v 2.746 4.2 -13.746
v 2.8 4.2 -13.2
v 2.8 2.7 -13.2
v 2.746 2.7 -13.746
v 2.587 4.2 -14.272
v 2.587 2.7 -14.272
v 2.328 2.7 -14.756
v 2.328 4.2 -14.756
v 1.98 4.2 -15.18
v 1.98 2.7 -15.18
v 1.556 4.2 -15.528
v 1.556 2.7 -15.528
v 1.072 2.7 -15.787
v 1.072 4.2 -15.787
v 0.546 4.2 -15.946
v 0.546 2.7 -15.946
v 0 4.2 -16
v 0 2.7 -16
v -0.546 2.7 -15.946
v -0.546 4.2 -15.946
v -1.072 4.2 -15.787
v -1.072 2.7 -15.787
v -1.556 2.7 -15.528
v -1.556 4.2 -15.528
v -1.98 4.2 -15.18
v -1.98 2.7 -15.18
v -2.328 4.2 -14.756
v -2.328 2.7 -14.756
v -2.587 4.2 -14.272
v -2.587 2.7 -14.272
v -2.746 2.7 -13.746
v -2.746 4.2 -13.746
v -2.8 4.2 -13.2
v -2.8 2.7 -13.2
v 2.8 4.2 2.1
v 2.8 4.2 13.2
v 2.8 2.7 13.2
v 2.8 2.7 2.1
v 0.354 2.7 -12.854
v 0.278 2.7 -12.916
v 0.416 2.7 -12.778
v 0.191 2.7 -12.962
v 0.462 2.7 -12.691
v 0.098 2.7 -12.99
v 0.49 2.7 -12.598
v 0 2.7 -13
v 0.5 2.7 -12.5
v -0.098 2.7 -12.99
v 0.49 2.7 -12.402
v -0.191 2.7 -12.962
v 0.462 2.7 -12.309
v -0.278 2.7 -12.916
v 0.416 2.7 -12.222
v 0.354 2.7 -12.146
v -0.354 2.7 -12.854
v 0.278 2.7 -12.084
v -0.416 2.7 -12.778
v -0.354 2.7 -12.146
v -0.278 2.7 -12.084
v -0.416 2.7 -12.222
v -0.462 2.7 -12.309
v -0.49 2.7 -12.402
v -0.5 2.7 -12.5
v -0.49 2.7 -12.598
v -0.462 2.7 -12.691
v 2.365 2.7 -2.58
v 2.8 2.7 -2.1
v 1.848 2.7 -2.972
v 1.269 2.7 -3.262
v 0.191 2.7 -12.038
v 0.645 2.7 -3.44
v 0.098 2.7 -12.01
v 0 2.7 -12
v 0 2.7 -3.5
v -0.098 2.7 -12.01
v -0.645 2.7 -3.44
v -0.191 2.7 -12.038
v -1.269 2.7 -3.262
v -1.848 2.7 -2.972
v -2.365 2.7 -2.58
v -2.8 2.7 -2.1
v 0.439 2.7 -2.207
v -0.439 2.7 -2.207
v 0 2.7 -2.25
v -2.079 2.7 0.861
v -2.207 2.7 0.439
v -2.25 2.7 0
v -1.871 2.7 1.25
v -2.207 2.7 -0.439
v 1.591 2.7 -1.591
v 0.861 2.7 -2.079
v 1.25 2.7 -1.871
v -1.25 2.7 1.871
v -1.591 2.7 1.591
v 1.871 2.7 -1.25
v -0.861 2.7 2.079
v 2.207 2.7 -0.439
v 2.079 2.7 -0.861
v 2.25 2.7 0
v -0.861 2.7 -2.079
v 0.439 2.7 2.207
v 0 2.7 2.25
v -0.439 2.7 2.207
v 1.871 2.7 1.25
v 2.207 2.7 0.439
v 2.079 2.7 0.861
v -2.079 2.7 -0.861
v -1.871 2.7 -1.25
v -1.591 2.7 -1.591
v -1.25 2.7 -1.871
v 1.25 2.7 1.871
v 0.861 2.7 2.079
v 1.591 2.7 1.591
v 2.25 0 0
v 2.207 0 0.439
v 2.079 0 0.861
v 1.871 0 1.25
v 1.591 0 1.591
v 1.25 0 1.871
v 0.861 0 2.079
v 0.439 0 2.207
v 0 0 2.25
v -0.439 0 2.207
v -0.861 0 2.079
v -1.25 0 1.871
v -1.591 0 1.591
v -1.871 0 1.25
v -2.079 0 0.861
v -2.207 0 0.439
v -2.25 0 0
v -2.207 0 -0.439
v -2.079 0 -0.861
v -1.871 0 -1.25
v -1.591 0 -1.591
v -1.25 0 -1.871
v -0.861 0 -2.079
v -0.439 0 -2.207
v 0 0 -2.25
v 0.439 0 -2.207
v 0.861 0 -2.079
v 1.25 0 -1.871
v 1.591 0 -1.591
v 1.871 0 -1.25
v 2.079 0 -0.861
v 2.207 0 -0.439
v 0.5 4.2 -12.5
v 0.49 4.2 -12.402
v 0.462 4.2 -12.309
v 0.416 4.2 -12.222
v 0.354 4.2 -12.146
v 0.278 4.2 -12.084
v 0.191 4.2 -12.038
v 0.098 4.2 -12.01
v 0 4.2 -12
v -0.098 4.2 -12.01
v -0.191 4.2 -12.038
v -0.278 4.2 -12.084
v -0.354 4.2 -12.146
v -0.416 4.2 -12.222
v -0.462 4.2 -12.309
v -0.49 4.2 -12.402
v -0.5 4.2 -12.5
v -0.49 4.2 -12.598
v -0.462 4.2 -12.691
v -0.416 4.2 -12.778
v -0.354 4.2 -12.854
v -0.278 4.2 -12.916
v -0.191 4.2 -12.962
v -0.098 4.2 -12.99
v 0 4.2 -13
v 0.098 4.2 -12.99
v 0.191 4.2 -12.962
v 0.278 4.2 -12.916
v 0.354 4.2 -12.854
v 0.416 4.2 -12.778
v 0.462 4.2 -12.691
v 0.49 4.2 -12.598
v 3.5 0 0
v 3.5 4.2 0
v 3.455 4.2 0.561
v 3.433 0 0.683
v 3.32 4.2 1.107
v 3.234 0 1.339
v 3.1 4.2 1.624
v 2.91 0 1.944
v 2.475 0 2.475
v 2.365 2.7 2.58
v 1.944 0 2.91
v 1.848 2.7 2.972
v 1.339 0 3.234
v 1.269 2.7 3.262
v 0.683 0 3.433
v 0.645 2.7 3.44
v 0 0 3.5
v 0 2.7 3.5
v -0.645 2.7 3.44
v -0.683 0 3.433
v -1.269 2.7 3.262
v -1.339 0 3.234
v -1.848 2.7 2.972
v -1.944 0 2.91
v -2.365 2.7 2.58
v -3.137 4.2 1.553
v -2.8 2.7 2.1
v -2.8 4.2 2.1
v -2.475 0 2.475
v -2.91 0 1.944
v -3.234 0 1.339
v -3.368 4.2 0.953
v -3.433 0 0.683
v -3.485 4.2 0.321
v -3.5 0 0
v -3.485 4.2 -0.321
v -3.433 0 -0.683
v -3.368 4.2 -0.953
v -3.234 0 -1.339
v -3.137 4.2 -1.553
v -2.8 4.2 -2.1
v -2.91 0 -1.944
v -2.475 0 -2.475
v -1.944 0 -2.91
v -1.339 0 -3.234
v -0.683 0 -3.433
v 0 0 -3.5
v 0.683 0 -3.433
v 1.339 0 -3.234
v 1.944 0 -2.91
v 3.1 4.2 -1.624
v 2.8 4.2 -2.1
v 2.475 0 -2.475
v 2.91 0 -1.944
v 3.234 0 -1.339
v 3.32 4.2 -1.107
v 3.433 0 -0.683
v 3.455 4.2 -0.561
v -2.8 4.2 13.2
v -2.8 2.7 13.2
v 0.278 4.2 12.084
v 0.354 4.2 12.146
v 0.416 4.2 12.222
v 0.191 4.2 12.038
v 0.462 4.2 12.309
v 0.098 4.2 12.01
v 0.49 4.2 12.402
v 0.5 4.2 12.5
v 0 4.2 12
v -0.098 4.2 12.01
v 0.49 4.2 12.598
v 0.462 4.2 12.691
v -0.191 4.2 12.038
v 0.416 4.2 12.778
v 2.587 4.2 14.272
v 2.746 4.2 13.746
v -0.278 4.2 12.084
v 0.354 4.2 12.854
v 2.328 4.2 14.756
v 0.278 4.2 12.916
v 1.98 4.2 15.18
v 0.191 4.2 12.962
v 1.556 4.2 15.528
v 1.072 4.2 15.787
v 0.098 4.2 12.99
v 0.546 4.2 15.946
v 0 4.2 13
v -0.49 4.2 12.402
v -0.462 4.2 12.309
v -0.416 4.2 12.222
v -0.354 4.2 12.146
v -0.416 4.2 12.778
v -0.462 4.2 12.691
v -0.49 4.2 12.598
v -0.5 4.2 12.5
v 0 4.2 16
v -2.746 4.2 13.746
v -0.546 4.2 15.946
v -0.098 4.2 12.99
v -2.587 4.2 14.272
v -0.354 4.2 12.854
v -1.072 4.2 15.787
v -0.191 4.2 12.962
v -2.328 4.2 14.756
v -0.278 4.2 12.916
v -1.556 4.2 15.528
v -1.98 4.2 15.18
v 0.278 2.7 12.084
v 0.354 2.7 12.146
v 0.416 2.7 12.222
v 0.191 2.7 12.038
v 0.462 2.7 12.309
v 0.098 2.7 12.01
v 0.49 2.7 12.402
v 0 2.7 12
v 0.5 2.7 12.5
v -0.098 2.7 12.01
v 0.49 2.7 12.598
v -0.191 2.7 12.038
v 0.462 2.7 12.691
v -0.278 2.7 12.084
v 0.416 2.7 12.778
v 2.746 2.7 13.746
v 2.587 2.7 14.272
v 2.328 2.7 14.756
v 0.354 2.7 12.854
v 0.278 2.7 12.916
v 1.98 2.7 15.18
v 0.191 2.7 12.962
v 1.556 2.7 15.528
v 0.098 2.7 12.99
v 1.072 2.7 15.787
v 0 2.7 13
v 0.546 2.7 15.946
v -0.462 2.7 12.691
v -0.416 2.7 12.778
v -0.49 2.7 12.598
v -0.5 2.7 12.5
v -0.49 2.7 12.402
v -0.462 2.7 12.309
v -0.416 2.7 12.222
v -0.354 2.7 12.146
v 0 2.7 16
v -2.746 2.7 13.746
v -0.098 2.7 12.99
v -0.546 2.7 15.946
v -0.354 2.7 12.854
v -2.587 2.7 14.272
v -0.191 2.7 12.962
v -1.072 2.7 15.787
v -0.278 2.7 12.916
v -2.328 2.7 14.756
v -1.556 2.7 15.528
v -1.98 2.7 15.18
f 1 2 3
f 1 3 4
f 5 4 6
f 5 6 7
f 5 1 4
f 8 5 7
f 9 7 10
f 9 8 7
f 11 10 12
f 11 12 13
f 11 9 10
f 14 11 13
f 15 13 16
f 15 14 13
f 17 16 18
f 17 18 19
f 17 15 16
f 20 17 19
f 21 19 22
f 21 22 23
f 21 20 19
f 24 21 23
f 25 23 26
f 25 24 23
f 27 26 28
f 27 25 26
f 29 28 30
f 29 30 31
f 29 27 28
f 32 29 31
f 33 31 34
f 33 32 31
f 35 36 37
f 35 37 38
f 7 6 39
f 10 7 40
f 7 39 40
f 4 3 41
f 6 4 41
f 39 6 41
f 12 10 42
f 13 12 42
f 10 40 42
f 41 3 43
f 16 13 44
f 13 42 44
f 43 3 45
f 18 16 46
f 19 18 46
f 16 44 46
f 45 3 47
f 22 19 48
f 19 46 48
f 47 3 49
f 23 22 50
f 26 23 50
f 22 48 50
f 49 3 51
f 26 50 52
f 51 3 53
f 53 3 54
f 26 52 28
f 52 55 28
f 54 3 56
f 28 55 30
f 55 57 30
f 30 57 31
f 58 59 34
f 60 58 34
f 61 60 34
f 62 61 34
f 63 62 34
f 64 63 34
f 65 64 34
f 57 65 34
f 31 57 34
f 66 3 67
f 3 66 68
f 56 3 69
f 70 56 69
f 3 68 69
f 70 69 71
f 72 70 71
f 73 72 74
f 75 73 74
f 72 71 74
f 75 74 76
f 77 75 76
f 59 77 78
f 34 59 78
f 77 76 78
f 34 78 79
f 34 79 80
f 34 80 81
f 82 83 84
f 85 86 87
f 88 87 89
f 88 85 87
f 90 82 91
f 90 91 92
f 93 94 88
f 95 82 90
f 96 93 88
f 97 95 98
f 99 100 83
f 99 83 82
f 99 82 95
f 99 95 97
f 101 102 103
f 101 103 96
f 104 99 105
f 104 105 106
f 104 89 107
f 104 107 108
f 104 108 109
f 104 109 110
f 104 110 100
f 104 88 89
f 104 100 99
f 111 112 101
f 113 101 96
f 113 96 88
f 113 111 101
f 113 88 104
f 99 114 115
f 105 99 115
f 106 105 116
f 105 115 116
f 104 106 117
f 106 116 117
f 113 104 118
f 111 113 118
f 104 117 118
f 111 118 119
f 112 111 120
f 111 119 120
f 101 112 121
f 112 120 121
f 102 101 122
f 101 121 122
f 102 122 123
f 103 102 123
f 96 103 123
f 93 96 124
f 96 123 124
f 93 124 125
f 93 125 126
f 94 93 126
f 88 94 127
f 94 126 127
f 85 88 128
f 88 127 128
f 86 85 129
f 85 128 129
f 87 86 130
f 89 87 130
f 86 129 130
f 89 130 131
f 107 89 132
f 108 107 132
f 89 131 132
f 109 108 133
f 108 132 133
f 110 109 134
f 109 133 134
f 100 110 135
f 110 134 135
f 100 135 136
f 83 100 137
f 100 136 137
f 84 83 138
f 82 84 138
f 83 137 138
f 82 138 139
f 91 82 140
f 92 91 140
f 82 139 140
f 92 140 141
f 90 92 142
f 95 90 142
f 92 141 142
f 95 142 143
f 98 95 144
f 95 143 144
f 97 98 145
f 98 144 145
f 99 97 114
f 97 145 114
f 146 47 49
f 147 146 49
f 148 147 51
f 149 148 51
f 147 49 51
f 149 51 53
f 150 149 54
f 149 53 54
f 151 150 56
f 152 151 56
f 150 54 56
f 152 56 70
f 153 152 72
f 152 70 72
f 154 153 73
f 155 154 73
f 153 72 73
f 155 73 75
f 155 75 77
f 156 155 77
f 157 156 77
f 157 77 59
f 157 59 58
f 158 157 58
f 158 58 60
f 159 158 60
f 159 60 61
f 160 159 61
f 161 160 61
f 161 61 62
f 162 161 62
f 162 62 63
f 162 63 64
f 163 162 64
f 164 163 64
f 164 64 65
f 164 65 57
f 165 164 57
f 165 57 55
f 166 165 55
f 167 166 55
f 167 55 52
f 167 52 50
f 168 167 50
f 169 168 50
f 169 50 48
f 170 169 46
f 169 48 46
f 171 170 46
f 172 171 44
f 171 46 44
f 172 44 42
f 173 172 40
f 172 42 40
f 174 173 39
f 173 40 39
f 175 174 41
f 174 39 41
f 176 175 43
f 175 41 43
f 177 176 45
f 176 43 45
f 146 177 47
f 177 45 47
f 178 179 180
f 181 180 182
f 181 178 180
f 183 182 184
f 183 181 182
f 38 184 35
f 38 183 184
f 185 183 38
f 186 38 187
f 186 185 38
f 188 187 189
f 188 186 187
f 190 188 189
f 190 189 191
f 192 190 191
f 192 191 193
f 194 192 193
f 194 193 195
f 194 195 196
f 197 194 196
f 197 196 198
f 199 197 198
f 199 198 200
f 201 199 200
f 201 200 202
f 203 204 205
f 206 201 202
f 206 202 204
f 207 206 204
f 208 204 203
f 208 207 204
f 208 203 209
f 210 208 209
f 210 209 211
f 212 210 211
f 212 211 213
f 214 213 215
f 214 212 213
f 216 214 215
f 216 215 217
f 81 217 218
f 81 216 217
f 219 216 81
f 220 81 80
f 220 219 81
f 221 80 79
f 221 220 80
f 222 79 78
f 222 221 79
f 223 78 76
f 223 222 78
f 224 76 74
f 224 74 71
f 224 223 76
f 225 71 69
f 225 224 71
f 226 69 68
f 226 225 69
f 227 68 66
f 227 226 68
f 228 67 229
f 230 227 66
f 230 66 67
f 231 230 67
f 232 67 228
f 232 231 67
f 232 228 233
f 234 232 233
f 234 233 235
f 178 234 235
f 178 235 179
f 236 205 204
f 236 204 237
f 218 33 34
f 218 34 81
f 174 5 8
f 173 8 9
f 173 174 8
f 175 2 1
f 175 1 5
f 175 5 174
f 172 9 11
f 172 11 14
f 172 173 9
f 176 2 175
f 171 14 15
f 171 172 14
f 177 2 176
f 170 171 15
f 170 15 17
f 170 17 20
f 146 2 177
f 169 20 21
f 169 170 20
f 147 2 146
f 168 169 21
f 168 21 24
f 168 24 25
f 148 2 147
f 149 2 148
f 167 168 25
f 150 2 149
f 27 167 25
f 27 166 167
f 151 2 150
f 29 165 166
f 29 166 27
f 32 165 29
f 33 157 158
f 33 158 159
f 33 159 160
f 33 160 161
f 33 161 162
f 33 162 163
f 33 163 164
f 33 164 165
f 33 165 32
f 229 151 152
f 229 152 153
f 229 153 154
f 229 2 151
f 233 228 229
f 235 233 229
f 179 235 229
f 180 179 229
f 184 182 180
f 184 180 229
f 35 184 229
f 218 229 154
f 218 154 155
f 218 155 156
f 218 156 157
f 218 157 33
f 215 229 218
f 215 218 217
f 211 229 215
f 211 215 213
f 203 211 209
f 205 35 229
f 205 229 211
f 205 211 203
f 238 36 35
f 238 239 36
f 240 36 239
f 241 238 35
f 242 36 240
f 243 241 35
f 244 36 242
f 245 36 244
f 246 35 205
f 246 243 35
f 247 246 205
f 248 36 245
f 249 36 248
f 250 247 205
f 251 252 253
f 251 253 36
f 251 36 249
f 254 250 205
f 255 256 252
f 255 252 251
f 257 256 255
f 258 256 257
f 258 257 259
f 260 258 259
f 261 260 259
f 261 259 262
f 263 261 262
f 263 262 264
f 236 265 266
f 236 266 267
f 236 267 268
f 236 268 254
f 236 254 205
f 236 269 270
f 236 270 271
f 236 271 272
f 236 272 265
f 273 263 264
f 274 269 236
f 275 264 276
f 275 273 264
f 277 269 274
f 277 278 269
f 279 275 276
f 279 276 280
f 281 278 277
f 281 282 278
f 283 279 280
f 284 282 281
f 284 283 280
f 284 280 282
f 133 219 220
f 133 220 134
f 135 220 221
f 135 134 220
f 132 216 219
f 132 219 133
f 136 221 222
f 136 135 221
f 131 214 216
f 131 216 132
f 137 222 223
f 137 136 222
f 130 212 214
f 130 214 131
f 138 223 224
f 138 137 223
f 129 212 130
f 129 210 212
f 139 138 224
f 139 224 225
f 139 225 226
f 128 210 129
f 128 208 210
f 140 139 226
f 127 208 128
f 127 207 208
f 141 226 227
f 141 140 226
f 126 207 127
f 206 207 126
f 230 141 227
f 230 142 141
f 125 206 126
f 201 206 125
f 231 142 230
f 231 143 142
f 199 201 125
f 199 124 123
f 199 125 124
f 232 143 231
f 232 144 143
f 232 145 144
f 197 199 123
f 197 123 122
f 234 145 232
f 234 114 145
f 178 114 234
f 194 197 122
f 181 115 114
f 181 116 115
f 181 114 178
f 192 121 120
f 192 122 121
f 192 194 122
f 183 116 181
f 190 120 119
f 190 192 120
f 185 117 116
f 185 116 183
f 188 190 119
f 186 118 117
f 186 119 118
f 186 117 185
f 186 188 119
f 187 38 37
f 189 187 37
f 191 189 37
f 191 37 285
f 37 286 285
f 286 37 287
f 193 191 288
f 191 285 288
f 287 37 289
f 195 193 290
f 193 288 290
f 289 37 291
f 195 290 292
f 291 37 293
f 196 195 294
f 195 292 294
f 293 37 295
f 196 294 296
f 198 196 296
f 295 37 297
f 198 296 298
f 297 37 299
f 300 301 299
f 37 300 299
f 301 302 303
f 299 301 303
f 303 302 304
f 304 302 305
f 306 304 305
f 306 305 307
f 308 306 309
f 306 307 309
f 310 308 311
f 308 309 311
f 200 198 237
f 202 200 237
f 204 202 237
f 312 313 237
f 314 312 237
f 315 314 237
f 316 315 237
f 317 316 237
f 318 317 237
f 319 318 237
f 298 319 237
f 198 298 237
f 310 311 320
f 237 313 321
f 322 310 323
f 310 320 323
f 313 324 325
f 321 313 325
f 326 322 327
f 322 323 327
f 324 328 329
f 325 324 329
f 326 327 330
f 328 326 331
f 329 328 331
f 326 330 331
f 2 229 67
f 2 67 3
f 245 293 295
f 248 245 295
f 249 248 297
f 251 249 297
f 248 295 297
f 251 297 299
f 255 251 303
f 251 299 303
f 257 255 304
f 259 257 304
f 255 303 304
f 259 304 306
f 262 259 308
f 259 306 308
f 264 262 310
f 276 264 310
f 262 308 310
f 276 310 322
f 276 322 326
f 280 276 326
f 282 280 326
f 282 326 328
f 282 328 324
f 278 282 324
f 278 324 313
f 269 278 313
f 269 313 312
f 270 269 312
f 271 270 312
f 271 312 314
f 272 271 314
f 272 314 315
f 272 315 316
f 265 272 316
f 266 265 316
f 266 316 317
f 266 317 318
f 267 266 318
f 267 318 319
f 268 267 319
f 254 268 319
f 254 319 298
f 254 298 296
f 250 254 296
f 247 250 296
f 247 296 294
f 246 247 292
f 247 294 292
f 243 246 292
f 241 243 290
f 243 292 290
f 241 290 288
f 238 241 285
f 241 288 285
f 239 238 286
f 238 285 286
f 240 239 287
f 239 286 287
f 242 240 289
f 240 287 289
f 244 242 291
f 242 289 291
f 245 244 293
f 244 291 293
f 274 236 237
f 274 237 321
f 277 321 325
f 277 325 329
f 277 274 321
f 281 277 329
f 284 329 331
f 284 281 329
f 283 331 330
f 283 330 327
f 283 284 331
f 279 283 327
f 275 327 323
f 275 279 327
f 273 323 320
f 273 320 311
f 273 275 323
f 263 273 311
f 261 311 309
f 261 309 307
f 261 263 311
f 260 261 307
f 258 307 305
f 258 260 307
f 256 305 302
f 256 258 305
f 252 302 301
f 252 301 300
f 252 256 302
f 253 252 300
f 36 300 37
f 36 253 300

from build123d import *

# Parameters (mm, degrees)
F0_R     = 3.5
F1_DEPTH = 4.2
F3_DEPTH = 1.5
F4_R     = 0.5
F5_DEPTH = 25
F6_R     = 2.25
F7_DEPTH = 2.7


with BuildPart() as f1:
    # F0 (on Front) → F1 (new body)
    with BuildSketch(Plane.XZ):
        Circle(F0_R)
    extrude(amount=-F1_DEPTH)

    # F2 (on face) → F3 (join)
    with BuildSketch(Plane(origin=(0, 4.2, 0), x_dir=(-1, 0, 0), z_dir=(0, 1, 0))):
        with BuildLine():
            ThreePointArc((2.8, 13.2), (0, 16), (-2.8, 13.2))
            Line((-2.8, 13.2), (-2.8, -13.2))
            ThreePointArc((-2.8, -13.2), (0, -16), (2.8, -13.2))
            Line((2.8, -13.2), (2.8, 13.2))
        make_face()
    extrude(amount=-F3_DEPTH)

    # F4 (on face) → F5 (cut)
    with BuildSketch(Plane.XZ.offset(-2.7)):
        with Locations((0, 12.5)):
            Circle(F4_R)
        with Locations((0, -12.5)):
            Circle(F4_R)
    extrude(amount=-F5_DEPTH, mode=Mode.SUBTRACT)

    # F6 (on face) → F7 (cut)
    with BuildSketch(Plane.XZ):
        Circle(F6_R)
    extrude(amount=-F7_DEPTH, mode=Mode.SUBTRACT)


solid = f1.part
